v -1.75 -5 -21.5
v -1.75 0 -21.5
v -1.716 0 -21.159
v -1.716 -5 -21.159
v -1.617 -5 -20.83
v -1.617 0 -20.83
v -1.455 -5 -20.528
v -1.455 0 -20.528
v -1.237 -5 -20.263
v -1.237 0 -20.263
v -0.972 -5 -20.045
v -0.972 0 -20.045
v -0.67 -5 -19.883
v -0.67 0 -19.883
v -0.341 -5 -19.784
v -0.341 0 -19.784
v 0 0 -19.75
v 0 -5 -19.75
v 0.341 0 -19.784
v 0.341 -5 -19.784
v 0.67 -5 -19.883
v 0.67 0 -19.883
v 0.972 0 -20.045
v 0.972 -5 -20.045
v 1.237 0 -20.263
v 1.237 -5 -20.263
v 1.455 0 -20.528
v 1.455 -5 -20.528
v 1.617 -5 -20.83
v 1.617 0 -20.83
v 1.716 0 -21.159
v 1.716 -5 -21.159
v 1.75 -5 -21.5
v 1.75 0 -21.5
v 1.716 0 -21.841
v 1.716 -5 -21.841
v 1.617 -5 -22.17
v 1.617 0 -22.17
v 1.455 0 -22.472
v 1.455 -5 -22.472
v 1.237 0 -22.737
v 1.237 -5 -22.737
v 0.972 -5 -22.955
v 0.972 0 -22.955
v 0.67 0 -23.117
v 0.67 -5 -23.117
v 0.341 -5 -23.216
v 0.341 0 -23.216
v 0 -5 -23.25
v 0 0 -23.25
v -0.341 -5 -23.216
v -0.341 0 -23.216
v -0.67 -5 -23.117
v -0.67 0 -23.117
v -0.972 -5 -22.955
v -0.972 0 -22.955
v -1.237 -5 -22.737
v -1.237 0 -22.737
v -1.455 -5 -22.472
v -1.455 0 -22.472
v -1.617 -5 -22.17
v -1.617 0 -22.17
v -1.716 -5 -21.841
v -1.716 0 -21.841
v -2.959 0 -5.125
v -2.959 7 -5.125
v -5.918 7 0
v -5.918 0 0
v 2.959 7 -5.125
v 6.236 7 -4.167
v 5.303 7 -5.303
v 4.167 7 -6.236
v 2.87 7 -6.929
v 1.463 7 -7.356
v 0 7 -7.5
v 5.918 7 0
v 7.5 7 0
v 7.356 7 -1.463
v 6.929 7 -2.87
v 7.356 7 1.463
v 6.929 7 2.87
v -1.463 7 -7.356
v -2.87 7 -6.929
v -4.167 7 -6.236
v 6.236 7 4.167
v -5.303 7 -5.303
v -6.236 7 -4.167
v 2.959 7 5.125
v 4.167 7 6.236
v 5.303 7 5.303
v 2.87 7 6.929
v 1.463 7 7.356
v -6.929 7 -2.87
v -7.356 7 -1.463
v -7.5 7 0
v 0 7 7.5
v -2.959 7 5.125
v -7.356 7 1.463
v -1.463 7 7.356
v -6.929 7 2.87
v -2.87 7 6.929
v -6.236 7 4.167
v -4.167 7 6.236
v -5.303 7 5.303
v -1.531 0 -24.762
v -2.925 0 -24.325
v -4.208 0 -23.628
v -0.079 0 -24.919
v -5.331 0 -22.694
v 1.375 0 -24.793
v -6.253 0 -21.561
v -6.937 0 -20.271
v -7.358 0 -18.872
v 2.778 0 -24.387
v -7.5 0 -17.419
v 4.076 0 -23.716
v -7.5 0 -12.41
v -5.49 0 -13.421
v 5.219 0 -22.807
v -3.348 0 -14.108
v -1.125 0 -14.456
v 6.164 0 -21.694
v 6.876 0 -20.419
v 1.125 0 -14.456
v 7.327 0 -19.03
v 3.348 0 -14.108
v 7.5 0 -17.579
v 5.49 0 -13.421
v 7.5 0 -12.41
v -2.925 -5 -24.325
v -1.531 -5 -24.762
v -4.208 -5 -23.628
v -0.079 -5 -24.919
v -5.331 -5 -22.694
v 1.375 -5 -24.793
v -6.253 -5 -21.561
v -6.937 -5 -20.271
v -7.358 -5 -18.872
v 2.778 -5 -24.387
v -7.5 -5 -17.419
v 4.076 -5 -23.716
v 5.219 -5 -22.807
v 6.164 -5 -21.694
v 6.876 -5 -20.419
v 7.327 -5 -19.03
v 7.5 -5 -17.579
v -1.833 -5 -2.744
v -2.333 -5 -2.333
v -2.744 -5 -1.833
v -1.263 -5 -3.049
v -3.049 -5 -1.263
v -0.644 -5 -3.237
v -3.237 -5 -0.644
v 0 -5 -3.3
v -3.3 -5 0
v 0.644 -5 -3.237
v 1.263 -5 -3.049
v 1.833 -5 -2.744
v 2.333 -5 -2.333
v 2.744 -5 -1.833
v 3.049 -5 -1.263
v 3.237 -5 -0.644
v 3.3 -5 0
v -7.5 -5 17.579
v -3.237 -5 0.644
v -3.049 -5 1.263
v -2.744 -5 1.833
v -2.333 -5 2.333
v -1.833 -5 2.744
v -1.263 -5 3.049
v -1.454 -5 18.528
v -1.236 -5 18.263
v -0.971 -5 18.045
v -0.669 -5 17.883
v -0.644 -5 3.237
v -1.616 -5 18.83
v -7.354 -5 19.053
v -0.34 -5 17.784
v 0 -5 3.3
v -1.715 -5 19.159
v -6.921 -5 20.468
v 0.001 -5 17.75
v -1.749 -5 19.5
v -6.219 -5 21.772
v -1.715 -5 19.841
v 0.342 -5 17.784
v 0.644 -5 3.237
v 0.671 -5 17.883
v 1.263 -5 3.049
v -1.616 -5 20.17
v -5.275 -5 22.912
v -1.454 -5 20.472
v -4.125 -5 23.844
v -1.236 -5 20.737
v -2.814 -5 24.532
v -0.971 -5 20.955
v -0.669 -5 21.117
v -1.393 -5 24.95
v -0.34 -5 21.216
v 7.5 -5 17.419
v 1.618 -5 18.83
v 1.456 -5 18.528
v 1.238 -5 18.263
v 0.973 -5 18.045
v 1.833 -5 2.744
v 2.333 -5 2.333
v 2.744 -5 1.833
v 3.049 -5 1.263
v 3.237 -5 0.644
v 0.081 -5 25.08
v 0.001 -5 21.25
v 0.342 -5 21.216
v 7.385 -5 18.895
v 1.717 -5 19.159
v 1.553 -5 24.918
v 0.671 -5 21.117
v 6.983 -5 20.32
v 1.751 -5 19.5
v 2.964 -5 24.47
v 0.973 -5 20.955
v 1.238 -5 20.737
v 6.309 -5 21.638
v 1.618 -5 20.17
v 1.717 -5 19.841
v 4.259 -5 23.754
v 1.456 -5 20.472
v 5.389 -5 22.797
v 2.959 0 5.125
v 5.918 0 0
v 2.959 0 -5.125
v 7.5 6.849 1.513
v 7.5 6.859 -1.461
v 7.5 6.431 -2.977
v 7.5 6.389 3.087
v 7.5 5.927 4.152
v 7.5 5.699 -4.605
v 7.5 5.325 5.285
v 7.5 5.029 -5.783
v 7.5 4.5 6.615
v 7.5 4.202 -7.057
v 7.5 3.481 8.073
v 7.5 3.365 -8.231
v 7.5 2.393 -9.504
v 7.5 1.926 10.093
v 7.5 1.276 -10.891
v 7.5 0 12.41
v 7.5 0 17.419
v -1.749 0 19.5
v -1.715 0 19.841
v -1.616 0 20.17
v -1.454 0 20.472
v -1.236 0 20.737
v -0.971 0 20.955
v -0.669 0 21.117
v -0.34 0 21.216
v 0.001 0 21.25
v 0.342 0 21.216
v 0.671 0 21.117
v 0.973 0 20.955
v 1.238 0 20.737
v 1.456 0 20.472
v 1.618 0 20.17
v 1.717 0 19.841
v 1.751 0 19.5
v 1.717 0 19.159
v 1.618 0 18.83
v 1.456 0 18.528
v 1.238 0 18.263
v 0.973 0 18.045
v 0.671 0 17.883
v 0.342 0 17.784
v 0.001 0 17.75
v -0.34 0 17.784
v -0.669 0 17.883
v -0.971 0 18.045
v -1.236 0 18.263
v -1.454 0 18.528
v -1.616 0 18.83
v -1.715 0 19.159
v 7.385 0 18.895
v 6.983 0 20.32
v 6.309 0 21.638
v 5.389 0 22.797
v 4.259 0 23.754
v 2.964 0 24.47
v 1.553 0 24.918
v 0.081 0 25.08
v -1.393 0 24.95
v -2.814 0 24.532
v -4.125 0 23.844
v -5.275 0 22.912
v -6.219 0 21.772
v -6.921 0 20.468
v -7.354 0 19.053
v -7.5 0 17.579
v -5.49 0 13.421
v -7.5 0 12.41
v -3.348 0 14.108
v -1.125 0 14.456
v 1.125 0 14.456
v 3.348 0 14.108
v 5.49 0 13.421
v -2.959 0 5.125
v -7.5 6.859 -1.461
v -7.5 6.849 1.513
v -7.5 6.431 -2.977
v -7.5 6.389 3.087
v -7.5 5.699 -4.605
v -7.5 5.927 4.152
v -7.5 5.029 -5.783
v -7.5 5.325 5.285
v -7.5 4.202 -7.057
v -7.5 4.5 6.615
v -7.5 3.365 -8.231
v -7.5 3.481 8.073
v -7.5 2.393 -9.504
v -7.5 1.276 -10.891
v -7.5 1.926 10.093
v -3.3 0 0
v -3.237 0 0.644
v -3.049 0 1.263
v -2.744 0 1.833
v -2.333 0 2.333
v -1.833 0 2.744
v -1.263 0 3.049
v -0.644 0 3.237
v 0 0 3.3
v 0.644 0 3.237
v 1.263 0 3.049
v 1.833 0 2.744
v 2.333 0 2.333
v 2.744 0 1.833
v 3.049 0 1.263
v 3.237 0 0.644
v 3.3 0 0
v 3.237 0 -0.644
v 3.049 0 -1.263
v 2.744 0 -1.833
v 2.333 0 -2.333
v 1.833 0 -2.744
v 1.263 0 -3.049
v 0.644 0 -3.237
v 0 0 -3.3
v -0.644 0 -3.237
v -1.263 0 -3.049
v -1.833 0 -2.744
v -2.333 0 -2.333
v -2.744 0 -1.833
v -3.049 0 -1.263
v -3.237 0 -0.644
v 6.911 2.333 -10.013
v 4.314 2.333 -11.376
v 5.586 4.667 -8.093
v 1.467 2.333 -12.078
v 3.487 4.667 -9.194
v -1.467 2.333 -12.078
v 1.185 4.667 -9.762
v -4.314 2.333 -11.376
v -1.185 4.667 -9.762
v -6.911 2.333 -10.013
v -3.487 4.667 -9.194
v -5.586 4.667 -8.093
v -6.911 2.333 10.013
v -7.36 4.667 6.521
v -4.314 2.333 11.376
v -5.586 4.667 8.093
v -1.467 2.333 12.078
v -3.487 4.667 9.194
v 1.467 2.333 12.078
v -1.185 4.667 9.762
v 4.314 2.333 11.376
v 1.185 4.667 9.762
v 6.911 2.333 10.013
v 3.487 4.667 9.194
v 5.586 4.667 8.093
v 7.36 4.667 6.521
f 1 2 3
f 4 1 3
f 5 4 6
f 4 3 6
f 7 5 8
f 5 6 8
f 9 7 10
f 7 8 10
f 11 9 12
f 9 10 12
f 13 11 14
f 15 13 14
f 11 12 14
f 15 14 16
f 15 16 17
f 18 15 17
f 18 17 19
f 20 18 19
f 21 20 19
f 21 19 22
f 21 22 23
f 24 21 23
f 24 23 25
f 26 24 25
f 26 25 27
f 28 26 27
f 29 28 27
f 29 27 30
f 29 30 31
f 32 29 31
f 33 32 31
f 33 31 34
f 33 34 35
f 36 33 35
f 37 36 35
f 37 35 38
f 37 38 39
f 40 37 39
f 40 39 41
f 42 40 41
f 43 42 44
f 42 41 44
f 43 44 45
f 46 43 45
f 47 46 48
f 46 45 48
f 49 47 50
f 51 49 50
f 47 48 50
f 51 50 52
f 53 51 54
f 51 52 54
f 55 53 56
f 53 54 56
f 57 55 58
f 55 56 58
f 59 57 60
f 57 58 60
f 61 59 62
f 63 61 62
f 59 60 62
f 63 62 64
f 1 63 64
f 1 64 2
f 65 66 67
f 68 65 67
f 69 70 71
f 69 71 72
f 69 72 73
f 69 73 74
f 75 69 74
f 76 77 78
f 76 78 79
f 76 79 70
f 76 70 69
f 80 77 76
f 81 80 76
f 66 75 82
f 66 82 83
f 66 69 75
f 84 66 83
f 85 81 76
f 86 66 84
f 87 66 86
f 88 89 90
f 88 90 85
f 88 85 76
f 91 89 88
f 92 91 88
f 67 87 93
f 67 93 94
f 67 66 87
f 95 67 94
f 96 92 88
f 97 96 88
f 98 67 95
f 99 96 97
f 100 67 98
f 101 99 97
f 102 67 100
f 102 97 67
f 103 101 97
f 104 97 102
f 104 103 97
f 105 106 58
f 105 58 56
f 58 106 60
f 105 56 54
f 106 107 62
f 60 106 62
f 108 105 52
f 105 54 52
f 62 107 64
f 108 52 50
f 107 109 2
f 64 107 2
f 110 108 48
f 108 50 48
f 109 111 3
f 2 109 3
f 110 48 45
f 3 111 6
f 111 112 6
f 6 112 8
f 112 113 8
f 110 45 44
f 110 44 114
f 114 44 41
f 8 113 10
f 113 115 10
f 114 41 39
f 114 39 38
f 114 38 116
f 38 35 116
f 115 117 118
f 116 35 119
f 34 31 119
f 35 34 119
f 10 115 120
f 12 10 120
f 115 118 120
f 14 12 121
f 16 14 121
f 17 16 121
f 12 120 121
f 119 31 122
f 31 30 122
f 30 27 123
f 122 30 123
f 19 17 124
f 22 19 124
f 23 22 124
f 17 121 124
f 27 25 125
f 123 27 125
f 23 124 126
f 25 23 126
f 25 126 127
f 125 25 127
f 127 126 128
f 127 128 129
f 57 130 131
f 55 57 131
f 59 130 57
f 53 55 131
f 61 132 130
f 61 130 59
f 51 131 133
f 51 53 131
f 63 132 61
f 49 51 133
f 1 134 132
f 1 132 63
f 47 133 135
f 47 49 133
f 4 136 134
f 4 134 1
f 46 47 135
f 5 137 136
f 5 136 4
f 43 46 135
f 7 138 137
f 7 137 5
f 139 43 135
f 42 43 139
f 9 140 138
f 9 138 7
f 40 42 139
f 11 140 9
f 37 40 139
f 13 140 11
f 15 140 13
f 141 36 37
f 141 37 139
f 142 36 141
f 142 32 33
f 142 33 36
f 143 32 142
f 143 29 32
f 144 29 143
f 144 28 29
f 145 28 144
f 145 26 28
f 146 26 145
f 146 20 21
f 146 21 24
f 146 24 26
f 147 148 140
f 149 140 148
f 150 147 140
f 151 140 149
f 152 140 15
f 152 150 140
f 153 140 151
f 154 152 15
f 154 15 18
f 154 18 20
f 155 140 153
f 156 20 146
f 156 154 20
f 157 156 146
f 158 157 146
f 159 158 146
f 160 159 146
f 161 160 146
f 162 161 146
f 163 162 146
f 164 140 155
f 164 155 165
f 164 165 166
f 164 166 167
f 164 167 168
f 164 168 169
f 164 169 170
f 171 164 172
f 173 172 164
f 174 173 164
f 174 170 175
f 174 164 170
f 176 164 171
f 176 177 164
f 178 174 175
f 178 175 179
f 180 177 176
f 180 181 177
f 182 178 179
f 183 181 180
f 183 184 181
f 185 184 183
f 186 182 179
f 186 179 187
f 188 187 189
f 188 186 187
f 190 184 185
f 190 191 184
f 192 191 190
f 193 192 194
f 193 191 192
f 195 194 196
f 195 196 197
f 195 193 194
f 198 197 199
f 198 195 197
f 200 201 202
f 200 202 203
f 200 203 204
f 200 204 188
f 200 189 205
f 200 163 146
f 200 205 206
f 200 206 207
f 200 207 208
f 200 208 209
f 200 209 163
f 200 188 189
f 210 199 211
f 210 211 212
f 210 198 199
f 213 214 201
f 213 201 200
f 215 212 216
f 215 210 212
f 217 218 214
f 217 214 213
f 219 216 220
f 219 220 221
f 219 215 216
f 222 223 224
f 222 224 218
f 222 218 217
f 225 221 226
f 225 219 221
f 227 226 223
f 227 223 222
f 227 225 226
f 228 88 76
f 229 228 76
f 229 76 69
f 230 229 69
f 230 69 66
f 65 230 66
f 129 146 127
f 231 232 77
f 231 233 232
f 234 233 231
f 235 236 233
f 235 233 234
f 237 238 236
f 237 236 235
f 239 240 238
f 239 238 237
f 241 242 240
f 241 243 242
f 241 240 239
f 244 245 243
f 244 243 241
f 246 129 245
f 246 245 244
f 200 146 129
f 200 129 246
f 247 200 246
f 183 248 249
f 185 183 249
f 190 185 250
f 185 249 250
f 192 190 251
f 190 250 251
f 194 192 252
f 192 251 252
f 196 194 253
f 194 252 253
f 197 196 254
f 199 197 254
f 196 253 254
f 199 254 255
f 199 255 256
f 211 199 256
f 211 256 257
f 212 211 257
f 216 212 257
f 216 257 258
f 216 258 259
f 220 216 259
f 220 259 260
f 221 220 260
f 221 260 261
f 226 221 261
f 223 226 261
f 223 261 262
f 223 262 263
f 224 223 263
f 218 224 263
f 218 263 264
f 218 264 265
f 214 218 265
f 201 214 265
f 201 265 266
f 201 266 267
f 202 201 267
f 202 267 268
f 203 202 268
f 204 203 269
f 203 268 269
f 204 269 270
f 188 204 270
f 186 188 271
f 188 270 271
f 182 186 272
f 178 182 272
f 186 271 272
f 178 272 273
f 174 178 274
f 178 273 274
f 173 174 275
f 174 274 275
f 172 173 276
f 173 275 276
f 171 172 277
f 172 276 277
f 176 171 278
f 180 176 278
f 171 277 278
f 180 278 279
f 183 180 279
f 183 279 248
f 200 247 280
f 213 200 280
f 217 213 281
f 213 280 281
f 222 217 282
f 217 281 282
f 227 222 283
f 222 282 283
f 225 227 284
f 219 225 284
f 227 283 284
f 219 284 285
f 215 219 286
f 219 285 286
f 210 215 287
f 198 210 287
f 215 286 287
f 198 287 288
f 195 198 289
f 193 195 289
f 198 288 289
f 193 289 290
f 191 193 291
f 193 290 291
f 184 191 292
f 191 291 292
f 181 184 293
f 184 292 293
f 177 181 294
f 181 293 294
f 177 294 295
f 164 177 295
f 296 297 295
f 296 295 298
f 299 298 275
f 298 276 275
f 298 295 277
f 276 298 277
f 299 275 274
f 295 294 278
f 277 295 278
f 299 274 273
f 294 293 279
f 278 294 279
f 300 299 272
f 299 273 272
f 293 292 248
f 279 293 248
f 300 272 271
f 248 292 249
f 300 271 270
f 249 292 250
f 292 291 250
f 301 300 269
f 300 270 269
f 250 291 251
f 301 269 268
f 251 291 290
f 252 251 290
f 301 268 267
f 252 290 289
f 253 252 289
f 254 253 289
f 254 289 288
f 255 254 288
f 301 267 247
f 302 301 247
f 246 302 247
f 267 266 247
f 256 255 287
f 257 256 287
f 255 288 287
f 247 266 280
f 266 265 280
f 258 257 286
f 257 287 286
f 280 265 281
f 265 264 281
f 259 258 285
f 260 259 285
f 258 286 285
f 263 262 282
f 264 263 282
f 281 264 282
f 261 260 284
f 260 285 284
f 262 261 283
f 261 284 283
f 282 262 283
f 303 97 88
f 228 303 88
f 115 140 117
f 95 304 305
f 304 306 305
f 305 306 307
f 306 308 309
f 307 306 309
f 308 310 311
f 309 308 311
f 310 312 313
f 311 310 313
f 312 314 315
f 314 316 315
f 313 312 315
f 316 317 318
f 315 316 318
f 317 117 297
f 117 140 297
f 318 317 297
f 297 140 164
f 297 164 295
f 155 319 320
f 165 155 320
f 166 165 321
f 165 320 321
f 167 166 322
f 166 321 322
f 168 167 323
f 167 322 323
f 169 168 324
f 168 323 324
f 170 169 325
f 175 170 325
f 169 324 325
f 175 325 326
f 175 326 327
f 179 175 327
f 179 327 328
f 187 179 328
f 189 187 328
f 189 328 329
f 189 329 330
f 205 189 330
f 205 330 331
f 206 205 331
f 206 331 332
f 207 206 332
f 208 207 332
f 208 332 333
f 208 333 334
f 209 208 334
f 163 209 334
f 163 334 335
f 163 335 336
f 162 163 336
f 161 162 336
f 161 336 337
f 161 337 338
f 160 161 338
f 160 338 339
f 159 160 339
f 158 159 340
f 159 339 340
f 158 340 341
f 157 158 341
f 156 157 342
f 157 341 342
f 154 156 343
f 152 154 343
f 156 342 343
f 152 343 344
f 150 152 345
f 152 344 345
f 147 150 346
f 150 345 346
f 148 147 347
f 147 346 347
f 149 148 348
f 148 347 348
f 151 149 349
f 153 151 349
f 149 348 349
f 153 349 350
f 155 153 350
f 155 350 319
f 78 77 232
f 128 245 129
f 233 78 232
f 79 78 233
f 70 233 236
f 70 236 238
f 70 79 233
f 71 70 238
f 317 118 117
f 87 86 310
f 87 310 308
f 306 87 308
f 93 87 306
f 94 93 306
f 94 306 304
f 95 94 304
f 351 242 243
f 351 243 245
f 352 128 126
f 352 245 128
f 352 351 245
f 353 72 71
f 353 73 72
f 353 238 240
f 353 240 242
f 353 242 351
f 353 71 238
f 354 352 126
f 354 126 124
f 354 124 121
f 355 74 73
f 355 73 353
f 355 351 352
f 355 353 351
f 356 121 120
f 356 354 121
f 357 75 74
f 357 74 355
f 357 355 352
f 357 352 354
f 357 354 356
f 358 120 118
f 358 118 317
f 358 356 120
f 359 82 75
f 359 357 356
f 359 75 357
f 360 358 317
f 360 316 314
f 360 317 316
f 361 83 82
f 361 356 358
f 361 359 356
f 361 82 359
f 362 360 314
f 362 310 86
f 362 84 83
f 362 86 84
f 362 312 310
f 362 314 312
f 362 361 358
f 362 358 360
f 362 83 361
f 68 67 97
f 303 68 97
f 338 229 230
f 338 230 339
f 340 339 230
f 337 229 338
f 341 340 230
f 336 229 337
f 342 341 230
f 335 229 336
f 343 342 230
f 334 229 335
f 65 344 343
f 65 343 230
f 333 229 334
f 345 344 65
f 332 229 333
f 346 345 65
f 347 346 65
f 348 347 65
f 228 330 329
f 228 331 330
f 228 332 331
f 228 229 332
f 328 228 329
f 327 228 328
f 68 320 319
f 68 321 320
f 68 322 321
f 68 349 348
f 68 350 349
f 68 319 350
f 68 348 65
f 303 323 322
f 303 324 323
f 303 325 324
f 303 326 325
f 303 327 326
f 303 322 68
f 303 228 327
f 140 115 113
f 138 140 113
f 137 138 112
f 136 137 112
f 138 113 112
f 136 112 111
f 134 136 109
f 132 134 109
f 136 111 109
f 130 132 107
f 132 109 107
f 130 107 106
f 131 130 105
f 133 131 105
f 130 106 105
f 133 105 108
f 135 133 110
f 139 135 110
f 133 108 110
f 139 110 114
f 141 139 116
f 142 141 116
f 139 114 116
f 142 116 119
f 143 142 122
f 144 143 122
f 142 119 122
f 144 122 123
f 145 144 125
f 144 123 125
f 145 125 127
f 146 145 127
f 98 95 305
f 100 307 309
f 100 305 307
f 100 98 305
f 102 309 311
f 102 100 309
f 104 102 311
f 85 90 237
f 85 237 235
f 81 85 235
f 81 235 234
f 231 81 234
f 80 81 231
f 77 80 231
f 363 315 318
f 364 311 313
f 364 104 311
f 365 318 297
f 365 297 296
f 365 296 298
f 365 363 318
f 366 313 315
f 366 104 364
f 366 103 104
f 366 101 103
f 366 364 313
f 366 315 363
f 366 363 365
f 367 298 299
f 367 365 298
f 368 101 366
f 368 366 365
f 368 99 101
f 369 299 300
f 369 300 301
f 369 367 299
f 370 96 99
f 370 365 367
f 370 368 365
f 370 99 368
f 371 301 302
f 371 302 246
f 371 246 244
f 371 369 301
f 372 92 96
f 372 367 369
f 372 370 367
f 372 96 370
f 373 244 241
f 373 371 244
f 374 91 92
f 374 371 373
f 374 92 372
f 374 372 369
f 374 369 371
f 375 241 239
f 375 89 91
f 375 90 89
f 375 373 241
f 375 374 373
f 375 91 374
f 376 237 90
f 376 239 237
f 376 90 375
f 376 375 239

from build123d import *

# Parameters (mm, degrees)
F1_DEPTH     = 5
F2_R         = 7.5
F3_DEPTH     = 7
F5_D         = 6.6
F7_DEPTH     = 7
F9_T4_ANGLE  = 179.9999997857
F9_T10_ANGLE = 180.0000002143
F10_D        = 3.5


# Not quite as in the source:
# - a fillet or chamfer that OpenCascade refuses, or shapes differently, is made with other operations: its cross-section is extruded or revolved along the edge and cut away or added


with BuildPart() as f1:
    # F0 (on Front) → F1 (new body)
    with BuildSketch(Plane.XZ):
        with BuildLine():
            ThreePointArc((-7.5, -17.4188318139), (-0.0794529453, -24.9192617628), (7.5, -17.5794483415))
            Line((7.5, -17.5794483415), (7.5, 17.4188318139))
            ThreePointArc((7.5, 17.4188318139), (0.0811727899, 25.0798782903), (-7.5, 17.5794483415))
            Line((-7.5, 17.5794483415), (-7.5, -17.4188318139))
        make_face()
    extrude(amount=F1_DEPTH)

    # F2 (on face) → F3 (join)
    with BuildSketch(Plane(origin=(0, 0, 0), x_dir=(-1, 0, 0), z_dir=(0, 1, 0))):
        Circle(F2_R)
    extrude(amount=F3_DEPTH)

    # F5 (through all)
    with Locations(Plane.XZ.offset(5)):
        with Locations((0, 0)):
            Hole(F5_D / 2)

    # F6 (on face) → F7 (cut, through all)
    with BuildSketch(Plane(origin=(0, 7, 0), x_dir=(-1, 0, 0), z_dir=(0, 1, 0))):
        Polygon((2.9589201296, -5.125), (5.9178402592, 0), (2.9589201296, 5.125), (-2.9589201296, 5.125), (-5.9178402592, 0), (-2.9589201296, -5.125), align=None)
    extrude(amount=-F7_DEPTH, mode=Mode.SUBTRACT)

    # F9: chamfer of 7 on 2 edges, made by hand


with BuildPart() as f9_tool2:
    # F9_s3 → F9_t4 (revolve)
    with BuildSketch(Plane.XY):
        Polygon((-14.5, 0), (-7.5, 7), (-7.5, 0), align=None)
    revolve(axis=Axis((0, 0, 0), (0, 1, 0)), revolution_arc=F9_T4_ANGLE)

    split(bisect_by=Plane.YZ.offset(-7.5), keep=Keep.TOP)

    split(bisect_by=Plane.YZ.offset(7.5), keep=Keep.BOTTOM)


with BuildPart() as f1_1:
    add(f1.part)

    # F9_t1: union F9_tool2
    add(f9_tool2.part)


with BuildPart() as f9_tool8:
    # F9_s9 → F9_t10 (revolve)
    with BuildSketch(Plane.XY):
        Polygon((14.5, 0), (7.5, 7), (7.5, 0), align=None)
    revolve(axis=Axis((0, 0, 0), (0, 1, 0)), revolution_arc=F9_T10_ANGLE)

    split(bisect_by=Plane.YZ.offset(-7.5), keep=Keep.TOP)

    split(bisect_by=Plane.YZ.offset(7.5), keep=Keep.BOTTOM)


with BuildPart() as f1_2:
    add(f1_1.part)

    # F9_t7: union F9_tool8
    add(f9_tool8.part)

    # F10 (through all)
    with Locations(Plane.XZ.offset(5)):
        with Locations((0.0010000484, 19.5), (0, -21.5)):
            Hole(F10_D / 2)


solid = f1_2.part
